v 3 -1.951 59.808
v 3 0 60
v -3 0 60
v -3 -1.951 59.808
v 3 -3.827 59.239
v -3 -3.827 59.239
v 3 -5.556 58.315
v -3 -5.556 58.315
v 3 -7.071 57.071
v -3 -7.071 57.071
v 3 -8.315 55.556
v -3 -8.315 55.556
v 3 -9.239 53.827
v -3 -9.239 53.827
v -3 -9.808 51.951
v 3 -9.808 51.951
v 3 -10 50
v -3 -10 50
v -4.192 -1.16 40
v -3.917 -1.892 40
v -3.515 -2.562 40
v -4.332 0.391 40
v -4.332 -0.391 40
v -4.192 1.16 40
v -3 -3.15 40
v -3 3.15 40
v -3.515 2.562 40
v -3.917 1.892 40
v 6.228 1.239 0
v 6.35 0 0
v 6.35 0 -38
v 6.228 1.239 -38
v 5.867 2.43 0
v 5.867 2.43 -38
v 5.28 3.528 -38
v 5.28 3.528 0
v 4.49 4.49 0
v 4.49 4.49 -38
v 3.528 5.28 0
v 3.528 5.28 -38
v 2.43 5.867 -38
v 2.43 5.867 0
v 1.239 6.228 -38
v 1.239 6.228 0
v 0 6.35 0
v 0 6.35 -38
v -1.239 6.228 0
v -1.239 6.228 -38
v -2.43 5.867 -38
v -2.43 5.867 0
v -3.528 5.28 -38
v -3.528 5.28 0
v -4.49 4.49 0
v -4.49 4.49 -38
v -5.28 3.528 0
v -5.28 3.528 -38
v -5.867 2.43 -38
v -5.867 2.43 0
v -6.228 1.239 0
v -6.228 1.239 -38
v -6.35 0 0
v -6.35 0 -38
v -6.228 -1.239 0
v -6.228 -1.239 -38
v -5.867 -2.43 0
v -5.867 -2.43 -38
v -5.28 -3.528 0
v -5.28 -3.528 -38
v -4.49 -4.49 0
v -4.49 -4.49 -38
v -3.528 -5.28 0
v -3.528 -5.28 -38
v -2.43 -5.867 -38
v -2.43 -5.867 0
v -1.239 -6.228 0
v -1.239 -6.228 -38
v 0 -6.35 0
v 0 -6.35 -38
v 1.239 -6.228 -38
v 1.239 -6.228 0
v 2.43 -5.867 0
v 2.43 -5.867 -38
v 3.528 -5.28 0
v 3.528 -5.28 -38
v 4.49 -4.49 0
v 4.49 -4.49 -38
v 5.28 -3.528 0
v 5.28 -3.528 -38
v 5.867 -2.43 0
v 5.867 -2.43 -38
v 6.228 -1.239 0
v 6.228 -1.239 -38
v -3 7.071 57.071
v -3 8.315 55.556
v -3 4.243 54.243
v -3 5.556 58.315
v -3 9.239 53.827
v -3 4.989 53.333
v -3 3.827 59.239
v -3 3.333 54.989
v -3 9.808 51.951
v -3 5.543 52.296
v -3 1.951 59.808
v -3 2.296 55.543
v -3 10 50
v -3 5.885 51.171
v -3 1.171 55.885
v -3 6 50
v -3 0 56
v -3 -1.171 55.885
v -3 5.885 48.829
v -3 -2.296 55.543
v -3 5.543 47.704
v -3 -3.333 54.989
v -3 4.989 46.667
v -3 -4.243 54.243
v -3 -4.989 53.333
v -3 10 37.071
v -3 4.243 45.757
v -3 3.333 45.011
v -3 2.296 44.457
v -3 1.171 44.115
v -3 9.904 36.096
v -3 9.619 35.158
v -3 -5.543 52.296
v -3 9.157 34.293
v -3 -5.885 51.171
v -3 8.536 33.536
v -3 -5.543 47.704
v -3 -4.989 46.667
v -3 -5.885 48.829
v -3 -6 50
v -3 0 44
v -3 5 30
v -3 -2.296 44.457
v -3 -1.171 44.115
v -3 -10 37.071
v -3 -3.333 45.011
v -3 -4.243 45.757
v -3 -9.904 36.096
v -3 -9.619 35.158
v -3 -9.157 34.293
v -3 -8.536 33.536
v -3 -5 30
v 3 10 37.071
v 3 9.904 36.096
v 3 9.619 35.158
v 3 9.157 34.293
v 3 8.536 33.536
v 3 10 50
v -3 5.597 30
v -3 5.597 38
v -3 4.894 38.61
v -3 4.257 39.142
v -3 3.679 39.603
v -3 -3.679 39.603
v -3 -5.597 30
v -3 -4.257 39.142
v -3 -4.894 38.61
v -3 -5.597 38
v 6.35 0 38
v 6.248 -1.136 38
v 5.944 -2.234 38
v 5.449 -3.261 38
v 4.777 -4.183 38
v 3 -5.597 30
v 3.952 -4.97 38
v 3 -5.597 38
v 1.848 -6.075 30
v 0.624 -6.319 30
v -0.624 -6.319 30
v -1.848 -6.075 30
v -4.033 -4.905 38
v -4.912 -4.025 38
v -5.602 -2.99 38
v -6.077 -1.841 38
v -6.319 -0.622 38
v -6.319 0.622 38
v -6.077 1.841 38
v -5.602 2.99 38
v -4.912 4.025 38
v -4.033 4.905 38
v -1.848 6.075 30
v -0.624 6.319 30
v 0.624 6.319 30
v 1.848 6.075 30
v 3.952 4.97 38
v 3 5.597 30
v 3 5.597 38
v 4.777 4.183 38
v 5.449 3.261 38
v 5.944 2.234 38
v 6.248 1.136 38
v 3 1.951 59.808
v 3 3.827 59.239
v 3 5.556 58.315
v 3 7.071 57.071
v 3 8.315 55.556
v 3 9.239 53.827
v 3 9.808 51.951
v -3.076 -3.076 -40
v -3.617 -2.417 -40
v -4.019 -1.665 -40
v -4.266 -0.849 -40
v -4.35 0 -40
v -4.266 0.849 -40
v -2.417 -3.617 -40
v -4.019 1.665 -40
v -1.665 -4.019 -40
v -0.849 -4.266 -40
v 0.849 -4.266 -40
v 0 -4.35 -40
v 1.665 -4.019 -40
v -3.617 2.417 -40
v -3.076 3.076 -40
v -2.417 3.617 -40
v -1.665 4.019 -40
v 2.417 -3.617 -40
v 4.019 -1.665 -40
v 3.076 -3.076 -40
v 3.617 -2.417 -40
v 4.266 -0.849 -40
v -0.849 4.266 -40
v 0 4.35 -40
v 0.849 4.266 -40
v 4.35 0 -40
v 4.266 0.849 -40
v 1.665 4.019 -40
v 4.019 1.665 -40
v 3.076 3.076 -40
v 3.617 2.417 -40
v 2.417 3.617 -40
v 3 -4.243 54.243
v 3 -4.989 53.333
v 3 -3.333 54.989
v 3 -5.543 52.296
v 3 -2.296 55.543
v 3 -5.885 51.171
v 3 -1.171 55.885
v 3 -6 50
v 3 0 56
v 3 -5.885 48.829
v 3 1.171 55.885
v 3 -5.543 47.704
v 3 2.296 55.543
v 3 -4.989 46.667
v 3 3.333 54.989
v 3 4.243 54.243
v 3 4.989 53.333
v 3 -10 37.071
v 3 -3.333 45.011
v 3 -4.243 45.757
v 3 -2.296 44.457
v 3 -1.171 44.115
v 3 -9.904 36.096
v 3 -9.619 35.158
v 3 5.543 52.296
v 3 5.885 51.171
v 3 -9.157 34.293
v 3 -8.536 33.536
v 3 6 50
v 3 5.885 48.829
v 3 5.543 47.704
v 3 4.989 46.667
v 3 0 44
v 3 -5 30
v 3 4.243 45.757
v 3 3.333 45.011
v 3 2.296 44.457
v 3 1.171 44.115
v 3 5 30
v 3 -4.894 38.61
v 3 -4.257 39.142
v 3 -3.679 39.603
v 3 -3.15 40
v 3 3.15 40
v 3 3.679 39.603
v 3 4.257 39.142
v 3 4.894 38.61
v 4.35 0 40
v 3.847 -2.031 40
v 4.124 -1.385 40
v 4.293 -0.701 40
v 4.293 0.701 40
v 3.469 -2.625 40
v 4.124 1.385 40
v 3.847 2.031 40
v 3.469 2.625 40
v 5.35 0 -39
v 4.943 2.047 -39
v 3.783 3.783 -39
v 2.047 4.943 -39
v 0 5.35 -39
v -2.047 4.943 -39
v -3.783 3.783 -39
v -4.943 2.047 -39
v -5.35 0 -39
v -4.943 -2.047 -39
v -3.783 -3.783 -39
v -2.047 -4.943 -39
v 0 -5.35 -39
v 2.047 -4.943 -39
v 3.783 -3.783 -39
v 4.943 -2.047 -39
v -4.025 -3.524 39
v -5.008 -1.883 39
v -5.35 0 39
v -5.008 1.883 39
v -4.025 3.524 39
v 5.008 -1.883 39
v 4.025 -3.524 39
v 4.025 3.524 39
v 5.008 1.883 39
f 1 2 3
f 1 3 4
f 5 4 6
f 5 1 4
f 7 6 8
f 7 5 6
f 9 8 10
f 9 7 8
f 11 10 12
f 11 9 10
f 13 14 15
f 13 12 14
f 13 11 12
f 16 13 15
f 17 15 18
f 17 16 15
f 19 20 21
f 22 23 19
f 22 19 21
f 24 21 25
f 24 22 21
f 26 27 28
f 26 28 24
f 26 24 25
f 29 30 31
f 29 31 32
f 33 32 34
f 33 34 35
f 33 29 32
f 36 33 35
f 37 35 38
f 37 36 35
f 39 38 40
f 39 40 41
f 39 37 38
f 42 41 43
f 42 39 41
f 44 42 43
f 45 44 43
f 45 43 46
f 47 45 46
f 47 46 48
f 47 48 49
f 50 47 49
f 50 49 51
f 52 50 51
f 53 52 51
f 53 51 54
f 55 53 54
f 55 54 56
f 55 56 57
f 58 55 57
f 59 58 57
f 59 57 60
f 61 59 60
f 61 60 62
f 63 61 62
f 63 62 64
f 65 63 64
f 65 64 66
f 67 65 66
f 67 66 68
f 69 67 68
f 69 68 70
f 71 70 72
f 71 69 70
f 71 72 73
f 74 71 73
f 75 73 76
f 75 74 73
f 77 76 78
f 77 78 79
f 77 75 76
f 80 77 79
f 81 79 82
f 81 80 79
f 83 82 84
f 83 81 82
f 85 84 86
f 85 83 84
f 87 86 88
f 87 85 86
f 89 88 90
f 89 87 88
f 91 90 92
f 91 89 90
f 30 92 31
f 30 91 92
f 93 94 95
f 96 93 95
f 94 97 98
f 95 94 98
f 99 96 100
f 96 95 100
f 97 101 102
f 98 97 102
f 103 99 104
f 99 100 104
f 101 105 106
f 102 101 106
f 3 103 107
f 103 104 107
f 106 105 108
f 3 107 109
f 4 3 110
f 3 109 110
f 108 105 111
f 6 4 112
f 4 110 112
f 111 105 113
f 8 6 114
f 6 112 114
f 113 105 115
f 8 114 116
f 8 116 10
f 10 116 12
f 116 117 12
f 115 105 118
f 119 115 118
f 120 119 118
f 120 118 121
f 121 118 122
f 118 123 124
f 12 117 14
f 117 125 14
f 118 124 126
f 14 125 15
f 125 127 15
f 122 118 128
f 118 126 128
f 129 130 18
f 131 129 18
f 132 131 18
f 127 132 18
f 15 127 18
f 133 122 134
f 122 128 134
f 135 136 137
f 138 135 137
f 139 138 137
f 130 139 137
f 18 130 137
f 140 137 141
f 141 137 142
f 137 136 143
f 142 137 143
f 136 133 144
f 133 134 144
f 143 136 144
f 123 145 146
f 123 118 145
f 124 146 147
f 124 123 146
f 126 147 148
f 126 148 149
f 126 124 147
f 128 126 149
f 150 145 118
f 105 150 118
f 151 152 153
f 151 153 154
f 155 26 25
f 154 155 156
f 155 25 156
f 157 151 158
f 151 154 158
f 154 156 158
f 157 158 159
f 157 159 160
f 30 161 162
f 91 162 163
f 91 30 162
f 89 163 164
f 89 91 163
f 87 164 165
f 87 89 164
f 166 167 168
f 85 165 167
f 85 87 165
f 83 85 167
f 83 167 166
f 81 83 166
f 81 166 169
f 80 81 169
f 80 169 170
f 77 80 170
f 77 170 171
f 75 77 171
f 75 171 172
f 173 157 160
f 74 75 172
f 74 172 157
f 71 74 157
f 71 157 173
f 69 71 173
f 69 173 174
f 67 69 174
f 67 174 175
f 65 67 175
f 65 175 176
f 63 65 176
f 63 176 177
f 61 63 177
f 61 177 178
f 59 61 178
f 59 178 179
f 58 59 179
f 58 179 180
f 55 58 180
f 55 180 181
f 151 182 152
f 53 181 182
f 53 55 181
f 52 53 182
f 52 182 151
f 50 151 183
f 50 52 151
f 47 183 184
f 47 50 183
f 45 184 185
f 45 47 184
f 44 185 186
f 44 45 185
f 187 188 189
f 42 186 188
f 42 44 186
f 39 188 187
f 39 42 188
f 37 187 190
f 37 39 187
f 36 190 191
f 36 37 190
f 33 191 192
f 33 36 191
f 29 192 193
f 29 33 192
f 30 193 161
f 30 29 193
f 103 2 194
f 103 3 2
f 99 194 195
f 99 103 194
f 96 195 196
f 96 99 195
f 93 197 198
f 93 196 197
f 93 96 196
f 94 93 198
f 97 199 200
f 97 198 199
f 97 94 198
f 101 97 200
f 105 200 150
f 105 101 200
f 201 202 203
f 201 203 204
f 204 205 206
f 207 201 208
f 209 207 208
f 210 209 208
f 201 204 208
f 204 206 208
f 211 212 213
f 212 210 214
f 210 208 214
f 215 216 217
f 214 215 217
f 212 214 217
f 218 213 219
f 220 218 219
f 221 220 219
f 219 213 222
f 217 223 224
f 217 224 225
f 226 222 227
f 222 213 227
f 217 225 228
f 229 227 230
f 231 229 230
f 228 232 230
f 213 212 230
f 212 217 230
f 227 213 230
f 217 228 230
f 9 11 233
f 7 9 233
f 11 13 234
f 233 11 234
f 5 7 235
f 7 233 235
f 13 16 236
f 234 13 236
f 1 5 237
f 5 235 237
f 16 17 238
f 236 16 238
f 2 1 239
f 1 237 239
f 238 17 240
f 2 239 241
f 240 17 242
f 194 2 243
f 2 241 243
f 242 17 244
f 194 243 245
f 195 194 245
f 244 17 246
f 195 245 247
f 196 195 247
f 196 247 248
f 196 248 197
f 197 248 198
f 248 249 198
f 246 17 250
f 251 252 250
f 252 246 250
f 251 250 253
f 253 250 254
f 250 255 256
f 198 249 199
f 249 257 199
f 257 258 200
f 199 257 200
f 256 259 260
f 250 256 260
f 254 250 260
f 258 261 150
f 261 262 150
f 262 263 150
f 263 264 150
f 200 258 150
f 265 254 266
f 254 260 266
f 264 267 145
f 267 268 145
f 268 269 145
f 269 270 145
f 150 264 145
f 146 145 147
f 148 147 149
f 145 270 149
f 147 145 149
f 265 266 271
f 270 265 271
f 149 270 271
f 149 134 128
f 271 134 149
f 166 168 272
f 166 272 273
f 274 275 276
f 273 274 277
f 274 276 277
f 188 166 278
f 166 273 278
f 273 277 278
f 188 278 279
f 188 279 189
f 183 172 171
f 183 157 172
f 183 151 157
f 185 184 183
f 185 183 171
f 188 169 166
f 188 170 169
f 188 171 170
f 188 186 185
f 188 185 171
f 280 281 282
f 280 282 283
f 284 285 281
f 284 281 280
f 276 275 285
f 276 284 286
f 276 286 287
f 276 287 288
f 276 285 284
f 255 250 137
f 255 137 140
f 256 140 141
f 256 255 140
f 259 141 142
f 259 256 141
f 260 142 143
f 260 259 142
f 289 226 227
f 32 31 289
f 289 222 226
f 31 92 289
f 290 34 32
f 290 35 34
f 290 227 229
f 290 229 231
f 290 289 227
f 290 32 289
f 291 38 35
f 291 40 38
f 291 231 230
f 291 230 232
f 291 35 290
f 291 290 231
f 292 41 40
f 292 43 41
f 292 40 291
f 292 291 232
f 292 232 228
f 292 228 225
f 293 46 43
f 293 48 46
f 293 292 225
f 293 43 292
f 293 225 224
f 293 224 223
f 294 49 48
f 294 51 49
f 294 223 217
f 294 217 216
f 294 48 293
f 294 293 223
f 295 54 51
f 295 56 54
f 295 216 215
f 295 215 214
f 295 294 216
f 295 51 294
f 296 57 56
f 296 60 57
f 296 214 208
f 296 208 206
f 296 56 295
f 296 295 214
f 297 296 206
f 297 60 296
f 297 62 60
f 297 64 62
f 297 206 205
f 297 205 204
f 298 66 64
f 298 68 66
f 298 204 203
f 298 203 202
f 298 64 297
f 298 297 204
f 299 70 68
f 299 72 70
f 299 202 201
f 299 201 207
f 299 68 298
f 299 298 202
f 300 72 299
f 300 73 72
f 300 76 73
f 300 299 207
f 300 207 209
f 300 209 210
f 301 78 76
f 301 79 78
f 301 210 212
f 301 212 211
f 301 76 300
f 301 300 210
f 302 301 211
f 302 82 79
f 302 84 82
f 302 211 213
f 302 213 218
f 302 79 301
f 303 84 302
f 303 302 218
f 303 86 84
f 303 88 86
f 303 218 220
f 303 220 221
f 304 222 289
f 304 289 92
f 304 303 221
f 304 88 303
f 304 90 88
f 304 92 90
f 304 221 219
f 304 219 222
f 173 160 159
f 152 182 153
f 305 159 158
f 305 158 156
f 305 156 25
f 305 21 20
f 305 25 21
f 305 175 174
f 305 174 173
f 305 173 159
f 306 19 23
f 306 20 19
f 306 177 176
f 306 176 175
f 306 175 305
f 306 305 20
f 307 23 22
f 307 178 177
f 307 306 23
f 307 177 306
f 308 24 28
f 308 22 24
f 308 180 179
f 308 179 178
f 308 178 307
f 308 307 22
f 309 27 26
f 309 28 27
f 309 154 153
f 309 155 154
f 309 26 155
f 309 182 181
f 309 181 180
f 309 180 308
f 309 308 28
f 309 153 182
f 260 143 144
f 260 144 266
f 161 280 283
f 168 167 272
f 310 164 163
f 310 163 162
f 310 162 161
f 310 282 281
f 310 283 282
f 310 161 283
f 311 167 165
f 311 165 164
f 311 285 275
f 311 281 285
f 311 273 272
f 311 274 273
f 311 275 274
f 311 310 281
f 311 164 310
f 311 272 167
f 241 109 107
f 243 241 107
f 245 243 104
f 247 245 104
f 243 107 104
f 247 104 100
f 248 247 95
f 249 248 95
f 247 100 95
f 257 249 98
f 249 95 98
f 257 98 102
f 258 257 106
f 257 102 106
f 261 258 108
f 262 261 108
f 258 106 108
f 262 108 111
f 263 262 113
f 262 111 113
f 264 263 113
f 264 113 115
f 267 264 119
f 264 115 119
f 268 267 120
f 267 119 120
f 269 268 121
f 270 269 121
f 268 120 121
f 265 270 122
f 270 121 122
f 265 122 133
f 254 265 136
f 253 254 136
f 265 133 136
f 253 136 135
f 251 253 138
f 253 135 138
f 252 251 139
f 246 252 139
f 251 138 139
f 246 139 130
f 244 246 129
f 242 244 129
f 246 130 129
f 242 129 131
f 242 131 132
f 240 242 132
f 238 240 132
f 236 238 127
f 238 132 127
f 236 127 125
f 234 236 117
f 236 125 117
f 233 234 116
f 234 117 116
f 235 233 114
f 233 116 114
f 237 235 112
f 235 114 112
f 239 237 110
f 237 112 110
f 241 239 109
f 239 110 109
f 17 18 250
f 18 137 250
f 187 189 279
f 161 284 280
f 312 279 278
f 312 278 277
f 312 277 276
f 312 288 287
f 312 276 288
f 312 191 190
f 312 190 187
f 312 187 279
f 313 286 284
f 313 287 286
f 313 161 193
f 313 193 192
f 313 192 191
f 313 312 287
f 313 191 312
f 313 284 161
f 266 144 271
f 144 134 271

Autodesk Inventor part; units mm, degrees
ref_plane "YZ Plane" through (0, 0, 0) normal (1, 0, 0) x (0, 1, 0)
ref_plane "XZ Plane" through (0, 0, 0) normal (0, 1, 0) x (-1, 0, 0)
ref_plane "XY Plane" through (0, 0, 0) normal (0, 0, 1) x (1, 0, 0)
sketch "Sketch1" plane through (0, 0, 0) normal (0, 0, 1) x (1, 0, 0)
  circle A0 centre (0, 0) radius 6.35
  dimension "d0" = 12.7
extrude "Extrusion1" add sketch "Sketch1" along normal mid plane 80
sketch "Sketch2" plane through (0, 0, 40) normal (0, 0, 1) x (1, 0, 0)
  line L0 (-3, -13.1035) -> (3, -13.1035)
  line L1 (3, -13.1035) -> (3, 13.1035)
  line L2 (3, 13.1035) -> (-3, 13.1035)
  line L3 (-3, 13.1035) -> (-3, -13.1035)
  line L4 (-3, -13.1035) -> (3, 13.1035) construction
  line L5 (3, -13.1035) -> (-3, 13.1035) construction
  point P0 (0, 0)
  dimension "d3" = 6
extrude "Extrusion2" cut sketch "Sketch2" against normal blind 10
sketch "Sketch3" plane through (0, 0, 30) normal (0, 0, 1) x (1, 0, 0)
  line L0 (-3, -10) -> (3, -10)
  line L1 (3, -10) -> (3, 10)
  line L2 (3, 10) -> (-3, 10)
  line L3 (-3, 10) -> (-3, -10)
  line L4 (-3, -10) -> (3, 10) construction
  line L5 (3, -10) -> (-3, 10) construction
  point P0 (0, 0)
  dimension "d6" = 6
  dimension "d7" = 20
extrude "Extrusion3" add sketch "Sketch3" along normal blind 30 separate body
fillet "Fillet1" radius 10 2 edges at (0, 10, 60) (0, -10, 60)
thread "Thread1" size "1/2-13 UNC" class "2A" standard "ANSI Unified Screw Threads" full length
chamfer "Chamfer1" distance 2 angle 45 1 edges at (-6.35, 0, -40)
sketch "Sketch5" plane through (-3, -10, 30) normal (-1, 0, 0) x (0, 0, 1)
  arc A0 (20, 0) -> (20, 20) centre (20, 10) ccw projected
  line L0 (0, 20) -> (20, 20) projected
  line L1 (0, 20) -> (0, 0) projected
  line L2 (0, 0) -> (20, 0) projected
  circle A1 centre (20, 10) radius 6
  point P0 (-30, 10)
  dimension "d20" = 12
extrude "Extrusion5" cut sketch "Sketch5" against normal through all contours A1 bodies 2
chamfer "Chamfer2" distance 2 angle 45 3 edges at (-6.35, 0, 40) (5.4485, -3.2613, 40) (5.4485, 3.2613, 40)
chamfer "Chamfer3" distance 5 angle 45 2 edges at (0, -10, 30) (0, 10, 30)
fillet "Fillet2" radius 5 2 edges at (0, -10, 35) (0, 10, 35)
properties part number "FRC220-1S"
